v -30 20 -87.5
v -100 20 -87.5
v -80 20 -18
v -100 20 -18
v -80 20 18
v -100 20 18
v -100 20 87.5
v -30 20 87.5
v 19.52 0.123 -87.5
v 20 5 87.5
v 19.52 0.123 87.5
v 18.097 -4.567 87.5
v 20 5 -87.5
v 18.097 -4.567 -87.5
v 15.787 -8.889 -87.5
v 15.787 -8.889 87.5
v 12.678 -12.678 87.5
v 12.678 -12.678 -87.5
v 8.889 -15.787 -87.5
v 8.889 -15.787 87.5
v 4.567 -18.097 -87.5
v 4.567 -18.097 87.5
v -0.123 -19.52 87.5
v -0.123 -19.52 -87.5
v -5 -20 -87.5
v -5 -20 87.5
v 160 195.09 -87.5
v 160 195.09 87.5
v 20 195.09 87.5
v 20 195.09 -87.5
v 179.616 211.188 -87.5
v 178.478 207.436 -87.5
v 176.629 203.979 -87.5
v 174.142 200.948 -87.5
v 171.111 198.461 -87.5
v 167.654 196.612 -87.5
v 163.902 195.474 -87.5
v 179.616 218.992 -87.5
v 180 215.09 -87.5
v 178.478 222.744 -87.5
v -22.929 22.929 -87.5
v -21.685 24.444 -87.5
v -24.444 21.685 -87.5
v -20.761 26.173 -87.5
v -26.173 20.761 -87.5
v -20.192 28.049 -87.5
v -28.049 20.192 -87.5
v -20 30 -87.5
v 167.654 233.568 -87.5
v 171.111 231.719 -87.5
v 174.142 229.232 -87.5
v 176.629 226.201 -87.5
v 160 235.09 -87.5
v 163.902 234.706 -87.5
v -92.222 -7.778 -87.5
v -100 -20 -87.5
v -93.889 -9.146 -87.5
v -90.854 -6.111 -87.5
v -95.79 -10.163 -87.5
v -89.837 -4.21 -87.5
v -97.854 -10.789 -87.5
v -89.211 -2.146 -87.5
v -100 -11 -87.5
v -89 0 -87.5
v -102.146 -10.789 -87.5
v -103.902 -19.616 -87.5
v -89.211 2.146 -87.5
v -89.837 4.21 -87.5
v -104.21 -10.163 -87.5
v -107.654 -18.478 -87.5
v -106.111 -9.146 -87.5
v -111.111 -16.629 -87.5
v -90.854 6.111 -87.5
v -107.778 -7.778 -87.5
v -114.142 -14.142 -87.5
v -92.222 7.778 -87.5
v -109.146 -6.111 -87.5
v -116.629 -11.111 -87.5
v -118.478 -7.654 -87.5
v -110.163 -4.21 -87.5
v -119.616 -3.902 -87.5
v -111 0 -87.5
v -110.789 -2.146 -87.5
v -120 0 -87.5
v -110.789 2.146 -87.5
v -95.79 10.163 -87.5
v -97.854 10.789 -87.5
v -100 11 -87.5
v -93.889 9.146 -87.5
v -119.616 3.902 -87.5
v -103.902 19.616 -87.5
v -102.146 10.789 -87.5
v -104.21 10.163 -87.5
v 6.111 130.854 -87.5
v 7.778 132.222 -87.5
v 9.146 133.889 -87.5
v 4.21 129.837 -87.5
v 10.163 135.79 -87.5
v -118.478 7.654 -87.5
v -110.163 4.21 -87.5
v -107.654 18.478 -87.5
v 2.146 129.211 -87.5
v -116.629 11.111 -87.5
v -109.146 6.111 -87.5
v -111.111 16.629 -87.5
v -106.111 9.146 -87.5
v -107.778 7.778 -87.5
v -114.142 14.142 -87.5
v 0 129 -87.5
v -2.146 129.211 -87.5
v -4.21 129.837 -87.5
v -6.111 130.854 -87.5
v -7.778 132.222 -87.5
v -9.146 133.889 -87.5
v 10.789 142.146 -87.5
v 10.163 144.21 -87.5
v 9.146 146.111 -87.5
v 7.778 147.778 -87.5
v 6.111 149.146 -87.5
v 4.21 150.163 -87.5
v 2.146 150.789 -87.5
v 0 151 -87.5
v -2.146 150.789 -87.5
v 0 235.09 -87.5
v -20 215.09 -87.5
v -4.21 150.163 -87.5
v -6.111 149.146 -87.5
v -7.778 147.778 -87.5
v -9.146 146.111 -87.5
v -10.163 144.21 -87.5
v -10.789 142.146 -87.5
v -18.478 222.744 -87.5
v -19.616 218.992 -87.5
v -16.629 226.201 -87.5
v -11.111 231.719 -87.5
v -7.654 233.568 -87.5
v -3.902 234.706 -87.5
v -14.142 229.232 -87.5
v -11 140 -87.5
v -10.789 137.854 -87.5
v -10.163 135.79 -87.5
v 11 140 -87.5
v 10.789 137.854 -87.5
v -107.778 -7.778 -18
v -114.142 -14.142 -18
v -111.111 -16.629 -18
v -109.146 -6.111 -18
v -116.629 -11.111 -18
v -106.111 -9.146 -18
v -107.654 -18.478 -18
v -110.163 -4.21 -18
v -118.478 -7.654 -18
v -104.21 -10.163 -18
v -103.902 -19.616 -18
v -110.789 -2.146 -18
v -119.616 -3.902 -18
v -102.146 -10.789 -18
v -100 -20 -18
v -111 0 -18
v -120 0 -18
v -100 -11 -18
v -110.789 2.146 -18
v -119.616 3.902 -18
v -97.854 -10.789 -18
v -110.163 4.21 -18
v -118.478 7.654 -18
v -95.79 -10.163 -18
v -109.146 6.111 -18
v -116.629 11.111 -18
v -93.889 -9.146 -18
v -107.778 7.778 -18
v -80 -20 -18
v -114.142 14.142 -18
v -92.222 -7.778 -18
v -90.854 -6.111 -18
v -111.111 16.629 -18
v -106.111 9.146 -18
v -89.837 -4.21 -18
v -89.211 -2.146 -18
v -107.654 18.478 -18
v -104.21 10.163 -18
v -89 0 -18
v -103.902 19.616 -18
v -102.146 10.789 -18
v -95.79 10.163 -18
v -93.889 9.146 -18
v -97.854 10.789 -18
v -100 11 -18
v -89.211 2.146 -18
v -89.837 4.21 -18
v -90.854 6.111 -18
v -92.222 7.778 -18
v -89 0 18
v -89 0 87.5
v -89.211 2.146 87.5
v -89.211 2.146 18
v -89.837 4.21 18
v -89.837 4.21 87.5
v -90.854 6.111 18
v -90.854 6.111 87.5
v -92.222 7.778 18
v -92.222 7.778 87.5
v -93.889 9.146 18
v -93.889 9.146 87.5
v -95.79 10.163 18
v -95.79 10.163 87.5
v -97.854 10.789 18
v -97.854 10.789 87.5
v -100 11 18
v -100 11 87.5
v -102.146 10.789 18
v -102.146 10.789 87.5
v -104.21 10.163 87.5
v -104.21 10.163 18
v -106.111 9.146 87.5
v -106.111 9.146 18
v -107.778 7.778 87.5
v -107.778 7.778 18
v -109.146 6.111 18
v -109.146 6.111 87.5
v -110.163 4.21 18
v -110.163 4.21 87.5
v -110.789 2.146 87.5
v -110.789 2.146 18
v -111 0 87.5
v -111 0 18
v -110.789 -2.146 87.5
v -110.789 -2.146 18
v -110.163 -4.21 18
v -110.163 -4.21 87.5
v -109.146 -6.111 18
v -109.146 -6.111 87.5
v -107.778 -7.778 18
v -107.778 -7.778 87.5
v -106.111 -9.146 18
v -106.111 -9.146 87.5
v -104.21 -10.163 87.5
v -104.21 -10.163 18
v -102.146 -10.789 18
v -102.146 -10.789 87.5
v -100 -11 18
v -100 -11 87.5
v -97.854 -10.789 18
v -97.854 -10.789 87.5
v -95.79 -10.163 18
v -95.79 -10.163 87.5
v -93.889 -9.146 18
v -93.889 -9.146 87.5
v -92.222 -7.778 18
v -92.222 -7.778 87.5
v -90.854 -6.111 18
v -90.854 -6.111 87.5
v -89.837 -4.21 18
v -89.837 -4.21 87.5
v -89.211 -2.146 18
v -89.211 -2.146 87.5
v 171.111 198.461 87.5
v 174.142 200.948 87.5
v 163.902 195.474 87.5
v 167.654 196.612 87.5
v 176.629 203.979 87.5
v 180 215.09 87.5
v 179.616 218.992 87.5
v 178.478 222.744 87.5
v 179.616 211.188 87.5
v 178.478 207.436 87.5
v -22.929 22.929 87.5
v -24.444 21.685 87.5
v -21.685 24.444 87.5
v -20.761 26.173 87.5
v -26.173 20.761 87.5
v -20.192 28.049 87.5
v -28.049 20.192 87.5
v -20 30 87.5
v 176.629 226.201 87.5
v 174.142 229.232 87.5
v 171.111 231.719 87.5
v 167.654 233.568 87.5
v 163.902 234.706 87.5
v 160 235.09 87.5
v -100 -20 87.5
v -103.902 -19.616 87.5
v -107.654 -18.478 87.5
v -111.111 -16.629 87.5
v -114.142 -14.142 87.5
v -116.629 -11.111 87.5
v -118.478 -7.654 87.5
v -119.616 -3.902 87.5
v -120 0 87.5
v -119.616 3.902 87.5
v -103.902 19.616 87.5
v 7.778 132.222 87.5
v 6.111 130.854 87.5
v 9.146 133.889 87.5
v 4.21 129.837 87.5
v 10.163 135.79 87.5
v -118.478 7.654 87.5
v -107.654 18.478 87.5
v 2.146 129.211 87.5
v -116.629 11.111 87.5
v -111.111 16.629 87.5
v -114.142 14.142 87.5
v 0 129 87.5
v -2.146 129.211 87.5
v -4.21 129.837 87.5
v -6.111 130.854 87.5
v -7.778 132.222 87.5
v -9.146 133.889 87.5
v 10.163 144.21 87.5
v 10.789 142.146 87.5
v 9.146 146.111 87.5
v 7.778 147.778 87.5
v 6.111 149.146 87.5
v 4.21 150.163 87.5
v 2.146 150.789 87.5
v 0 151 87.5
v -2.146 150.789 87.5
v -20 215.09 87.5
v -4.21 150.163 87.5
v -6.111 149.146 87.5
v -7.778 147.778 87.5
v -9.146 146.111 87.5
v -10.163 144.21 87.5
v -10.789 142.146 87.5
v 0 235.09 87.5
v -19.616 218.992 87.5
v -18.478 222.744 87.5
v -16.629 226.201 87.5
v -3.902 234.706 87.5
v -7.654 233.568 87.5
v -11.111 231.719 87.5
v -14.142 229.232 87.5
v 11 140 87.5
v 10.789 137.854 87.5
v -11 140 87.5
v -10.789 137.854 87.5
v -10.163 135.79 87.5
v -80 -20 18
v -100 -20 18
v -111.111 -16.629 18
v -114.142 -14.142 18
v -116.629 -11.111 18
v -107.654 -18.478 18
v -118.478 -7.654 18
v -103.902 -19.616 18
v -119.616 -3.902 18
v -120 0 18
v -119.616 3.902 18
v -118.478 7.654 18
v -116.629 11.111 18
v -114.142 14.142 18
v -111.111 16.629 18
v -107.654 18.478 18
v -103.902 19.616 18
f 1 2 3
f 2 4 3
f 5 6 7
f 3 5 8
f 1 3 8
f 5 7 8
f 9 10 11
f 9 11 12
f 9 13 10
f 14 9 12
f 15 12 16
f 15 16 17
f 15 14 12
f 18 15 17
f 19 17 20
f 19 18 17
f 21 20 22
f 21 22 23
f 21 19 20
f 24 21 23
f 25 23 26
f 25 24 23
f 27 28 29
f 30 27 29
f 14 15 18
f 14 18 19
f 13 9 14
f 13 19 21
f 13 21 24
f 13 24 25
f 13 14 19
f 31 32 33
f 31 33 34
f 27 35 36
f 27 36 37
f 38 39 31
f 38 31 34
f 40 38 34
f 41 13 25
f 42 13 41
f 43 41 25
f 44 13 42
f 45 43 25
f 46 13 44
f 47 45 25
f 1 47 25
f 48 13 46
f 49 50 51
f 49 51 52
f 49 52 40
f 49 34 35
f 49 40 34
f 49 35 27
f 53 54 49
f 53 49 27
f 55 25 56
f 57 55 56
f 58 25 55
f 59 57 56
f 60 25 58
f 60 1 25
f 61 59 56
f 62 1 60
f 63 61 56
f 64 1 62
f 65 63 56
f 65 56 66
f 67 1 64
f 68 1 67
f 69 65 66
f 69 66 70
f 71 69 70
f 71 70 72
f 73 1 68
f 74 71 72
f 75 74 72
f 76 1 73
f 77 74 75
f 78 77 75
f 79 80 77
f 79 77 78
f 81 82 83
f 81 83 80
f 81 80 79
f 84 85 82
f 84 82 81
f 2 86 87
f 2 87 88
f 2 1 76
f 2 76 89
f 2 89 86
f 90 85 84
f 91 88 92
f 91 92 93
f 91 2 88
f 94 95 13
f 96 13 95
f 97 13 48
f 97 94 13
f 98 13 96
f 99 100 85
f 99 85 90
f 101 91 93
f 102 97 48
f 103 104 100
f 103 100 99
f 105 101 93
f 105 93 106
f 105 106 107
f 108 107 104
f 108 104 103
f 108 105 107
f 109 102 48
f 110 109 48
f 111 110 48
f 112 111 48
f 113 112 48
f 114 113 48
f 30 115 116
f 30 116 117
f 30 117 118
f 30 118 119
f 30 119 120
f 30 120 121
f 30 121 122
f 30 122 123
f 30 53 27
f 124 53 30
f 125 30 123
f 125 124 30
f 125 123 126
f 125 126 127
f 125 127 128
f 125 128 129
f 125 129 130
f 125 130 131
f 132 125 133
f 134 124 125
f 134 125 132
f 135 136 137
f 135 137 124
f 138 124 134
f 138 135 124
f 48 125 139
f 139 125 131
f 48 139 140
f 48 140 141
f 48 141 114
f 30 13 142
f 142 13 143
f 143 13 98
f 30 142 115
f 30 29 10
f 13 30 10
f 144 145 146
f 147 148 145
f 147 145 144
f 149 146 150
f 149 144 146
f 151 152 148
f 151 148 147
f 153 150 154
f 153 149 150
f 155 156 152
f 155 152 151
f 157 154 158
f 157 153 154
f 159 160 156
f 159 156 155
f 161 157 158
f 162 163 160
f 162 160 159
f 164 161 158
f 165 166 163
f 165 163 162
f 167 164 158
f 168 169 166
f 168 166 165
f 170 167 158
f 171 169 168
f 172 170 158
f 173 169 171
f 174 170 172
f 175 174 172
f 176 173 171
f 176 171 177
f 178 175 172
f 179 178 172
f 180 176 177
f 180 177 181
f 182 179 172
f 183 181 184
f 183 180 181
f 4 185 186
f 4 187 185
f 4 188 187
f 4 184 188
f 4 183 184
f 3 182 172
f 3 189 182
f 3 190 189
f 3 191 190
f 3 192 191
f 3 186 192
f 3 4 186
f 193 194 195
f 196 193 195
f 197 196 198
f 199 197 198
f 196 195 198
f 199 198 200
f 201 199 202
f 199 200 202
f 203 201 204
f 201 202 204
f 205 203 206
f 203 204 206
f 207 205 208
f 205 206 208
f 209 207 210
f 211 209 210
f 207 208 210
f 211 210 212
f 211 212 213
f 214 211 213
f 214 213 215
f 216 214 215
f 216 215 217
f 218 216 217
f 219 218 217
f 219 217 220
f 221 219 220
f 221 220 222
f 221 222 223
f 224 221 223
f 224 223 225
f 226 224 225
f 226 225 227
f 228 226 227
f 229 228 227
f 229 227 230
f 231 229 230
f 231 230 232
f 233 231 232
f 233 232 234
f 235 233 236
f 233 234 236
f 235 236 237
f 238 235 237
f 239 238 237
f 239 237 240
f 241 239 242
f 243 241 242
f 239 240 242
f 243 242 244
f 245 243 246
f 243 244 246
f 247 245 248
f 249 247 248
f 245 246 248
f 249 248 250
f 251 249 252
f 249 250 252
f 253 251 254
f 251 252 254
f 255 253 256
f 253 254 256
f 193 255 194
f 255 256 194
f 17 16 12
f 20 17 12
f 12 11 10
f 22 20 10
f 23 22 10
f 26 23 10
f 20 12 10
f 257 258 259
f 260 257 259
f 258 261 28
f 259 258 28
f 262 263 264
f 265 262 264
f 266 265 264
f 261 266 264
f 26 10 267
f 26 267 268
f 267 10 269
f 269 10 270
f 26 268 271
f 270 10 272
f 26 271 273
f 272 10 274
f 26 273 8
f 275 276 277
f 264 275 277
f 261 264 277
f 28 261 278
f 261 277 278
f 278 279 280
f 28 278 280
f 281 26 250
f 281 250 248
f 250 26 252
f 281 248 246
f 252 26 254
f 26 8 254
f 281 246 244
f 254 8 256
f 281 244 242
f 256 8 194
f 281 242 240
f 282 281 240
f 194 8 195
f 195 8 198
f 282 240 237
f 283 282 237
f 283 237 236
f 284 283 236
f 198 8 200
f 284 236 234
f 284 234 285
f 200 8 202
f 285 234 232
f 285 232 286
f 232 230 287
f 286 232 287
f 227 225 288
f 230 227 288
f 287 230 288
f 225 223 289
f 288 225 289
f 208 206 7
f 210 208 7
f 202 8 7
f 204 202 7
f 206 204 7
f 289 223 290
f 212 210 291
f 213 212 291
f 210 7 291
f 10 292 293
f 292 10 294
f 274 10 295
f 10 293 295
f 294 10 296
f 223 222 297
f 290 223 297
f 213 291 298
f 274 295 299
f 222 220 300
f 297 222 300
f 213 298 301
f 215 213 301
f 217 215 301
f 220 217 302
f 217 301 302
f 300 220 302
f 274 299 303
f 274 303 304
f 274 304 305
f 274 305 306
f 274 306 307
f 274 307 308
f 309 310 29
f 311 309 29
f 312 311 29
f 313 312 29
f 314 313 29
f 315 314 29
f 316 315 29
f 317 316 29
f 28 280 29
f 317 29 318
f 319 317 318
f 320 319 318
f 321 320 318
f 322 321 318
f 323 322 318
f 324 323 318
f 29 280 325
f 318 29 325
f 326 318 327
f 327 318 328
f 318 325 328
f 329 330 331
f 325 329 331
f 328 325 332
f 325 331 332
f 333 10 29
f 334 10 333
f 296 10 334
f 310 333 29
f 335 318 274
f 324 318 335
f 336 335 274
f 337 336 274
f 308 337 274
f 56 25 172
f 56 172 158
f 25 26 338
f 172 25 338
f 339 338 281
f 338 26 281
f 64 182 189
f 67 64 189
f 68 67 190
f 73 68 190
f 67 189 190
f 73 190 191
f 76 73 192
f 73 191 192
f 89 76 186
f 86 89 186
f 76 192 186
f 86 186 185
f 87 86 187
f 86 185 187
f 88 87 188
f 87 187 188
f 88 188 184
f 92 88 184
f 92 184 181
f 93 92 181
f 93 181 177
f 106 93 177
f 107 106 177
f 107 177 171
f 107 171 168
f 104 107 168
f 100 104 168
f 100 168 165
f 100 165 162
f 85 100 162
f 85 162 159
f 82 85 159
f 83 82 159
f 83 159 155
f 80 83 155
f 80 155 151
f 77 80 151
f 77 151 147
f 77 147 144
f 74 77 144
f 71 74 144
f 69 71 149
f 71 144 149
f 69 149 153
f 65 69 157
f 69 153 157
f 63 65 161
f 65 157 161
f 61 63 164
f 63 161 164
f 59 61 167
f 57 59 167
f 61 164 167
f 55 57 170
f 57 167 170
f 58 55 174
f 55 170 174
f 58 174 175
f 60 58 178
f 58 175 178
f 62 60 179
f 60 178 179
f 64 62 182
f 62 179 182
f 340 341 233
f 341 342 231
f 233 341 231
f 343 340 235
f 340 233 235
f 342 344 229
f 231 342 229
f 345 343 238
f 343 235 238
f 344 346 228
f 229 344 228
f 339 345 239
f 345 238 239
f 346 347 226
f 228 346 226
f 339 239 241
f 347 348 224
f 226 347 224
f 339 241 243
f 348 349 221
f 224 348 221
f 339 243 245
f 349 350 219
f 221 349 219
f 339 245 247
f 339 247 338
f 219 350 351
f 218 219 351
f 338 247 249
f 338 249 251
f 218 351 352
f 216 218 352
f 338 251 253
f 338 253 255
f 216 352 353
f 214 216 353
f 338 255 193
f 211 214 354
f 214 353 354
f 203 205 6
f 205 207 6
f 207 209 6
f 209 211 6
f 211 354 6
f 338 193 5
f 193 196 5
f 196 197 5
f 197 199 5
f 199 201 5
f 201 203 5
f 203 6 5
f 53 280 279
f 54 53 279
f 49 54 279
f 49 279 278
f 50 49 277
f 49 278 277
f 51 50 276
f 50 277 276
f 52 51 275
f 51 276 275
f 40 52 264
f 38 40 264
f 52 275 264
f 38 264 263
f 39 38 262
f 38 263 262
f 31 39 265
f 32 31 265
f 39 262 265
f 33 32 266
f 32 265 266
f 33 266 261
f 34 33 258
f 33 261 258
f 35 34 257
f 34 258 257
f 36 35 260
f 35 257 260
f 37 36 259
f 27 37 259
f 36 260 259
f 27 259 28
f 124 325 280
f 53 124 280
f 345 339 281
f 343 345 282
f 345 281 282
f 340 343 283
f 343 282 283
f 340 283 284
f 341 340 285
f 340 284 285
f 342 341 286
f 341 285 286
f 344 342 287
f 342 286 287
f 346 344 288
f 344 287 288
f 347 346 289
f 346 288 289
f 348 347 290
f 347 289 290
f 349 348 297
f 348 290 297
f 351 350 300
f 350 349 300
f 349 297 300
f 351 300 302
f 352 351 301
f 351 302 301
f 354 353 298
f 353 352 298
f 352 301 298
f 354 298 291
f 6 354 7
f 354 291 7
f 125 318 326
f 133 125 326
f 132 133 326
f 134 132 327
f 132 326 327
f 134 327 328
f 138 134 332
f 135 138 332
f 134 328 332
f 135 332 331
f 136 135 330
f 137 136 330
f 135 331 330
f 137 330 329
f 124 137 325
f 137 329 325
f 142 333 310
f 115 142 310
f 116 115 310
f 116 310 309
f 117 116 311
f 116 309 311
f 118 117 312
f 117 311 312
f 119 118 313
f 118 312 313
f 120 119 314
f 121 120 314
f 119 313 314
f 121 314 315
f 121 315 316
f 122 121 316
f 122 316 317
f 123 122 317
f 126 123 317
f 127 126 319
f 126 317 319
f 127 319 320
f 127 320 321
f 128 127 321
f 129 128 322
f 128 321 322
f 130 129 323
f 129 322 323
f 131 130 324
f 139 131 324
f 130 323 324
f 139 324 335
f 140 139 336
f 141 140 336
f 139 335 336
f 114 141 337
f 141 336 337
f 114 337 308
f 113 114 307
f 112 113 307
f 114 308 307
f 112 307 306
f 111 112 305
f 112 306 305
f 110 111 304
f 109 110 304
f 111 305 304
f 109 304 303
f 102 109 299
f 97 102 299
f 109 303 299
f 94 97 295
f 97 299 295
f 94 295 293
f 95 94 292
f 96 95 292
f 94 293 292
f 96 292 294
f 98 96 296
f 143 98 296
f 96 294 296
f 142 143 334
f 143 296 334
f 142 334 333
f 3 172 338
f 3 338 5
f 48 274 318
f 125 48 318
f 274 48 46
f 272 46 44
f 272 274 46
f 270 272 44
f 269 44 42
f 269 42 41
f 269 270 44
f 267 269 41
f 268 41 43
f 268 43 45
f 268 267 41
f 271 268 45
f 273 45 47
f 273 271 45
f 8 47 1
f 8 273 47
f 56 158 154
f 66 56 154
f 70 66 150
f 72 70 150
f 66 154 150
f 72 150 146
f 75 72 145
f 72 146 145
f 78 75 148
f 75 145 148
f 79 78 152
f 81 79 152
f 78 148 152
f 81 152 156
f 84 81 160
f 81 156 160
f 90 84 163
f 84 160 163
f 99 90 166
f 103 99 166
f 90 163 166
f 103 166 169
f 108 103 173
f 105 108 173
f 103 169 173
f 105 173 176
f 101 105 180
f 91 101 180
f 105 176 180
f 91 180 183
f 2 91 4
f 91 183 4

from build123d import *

# Parameters (mm, degrees)
BOSS_EXTRUDE1_DEPTH     = 87.5
SKETCH2_R               = 11
CUT_EXTRUDE1_DEPTH      = 175
FILLET1_R               = 10
FILLET2_R               = 25
CUT_EXTRUDE2_DEPTH      = 18
CUT_EXTRUDE2_DEPTH_BACK = 18
SKETCH3_W               = 40
SKETCH3_H               = 40
BOSS_EXTRUDE2_START     = -175
BOSS_EXTRUDE2_DEPTH     = 175


with BuildPart() as part:
    # Sketch1 → Boss-Extrude1 (new, symmetric)
    with BuildSketch(Plane.XY):
        with BuildLine():
            Line((-20, 20), (-20, 140))
            ThreePointArc((-20, 140), (0, 160), (20, 140))
            Line((20, 140), (20, -20))
            Line((20, -20), (-100, -20))
            ThreePointArc((-100, -20), (-120, 0), (-100, 20))
            Line((-100, 20), (-20, 20))
        make_face()
    extrude(amount=BOSS_EXTRUDE1_DEPTH, both=True)

    # Sketch2 → Cut-Extrude1 (cut)
    with BuildSketch(Plane.XY.offset(87.5)):
        with Locations((-100, 0)):
            Circle(SKETCH2_R)
        with Locations((0, 140)):
            Circle(SKETCH2_R)
    extrude(amount=-CUT_EXTRUDE1_DEPTH, mode=Mode.SUBTRACT)

    # Fillet1
    fillet1_edges = [part.edges().sort_by_distance(p)[0] for p in [
        (-20, 20, 0),
    ]]
    fillet(fillet1_edges, radius=FILLET1_R)

    # Fillet2
    fillet2_edges = [part.edges().sort_by_distance(p)[0] for p in [
        (20, -20, 0),
    ]]
    fillet(fillet2_edges, radius=FILLET2_R)

    # Sketch3 → Cut-Extrude2 (cut, two sides: drawn at the far end of the back side and taken through both)
    with BuildSketch(Plane.XY.offset(-CUT_EXTRUDE2_DEPTH_BACK)):
        with Locations((-100, 0)):
            Rectangle(SKETCH3_W, SKETCH3_H)
    extrude(amount=CUT_EXTRUDE2_DEPTH + CUT_EXTRUDE2_DEPTH_BACK, mode=Mode.SUBTRACT)

    # Sketch4 → Boss-Extrude2 (add)
    with BuildSketch(Plane(origin=(0, 0, -87.5), x_dir=(-1, 0, 0), z_dir=(0, 0, -1)).offset(BOSS_EXTRUDE2_START)):
        with BuildLine():
            ThreePointArc((-20, 140), (0, 160), (20, 140))
            Line((20, 140), (20, 215.09))
            ThreePointArc((20, 215.09), (14.142135624, 229.232135624), (0, 235.09))
            Line((0, 235.09), (-160, 235.09))
            ThreePointArc((-160, 235.09), (-180, 215.09), (-160, 195.09))
            Line((-160, 195.09), (-20, 195.09))
            Line((-20, 195.09), (-20, 140))
        make_face()
    extrude(amount=BOSS_EXTRUDE2_DEPTH)


solid = part.part
